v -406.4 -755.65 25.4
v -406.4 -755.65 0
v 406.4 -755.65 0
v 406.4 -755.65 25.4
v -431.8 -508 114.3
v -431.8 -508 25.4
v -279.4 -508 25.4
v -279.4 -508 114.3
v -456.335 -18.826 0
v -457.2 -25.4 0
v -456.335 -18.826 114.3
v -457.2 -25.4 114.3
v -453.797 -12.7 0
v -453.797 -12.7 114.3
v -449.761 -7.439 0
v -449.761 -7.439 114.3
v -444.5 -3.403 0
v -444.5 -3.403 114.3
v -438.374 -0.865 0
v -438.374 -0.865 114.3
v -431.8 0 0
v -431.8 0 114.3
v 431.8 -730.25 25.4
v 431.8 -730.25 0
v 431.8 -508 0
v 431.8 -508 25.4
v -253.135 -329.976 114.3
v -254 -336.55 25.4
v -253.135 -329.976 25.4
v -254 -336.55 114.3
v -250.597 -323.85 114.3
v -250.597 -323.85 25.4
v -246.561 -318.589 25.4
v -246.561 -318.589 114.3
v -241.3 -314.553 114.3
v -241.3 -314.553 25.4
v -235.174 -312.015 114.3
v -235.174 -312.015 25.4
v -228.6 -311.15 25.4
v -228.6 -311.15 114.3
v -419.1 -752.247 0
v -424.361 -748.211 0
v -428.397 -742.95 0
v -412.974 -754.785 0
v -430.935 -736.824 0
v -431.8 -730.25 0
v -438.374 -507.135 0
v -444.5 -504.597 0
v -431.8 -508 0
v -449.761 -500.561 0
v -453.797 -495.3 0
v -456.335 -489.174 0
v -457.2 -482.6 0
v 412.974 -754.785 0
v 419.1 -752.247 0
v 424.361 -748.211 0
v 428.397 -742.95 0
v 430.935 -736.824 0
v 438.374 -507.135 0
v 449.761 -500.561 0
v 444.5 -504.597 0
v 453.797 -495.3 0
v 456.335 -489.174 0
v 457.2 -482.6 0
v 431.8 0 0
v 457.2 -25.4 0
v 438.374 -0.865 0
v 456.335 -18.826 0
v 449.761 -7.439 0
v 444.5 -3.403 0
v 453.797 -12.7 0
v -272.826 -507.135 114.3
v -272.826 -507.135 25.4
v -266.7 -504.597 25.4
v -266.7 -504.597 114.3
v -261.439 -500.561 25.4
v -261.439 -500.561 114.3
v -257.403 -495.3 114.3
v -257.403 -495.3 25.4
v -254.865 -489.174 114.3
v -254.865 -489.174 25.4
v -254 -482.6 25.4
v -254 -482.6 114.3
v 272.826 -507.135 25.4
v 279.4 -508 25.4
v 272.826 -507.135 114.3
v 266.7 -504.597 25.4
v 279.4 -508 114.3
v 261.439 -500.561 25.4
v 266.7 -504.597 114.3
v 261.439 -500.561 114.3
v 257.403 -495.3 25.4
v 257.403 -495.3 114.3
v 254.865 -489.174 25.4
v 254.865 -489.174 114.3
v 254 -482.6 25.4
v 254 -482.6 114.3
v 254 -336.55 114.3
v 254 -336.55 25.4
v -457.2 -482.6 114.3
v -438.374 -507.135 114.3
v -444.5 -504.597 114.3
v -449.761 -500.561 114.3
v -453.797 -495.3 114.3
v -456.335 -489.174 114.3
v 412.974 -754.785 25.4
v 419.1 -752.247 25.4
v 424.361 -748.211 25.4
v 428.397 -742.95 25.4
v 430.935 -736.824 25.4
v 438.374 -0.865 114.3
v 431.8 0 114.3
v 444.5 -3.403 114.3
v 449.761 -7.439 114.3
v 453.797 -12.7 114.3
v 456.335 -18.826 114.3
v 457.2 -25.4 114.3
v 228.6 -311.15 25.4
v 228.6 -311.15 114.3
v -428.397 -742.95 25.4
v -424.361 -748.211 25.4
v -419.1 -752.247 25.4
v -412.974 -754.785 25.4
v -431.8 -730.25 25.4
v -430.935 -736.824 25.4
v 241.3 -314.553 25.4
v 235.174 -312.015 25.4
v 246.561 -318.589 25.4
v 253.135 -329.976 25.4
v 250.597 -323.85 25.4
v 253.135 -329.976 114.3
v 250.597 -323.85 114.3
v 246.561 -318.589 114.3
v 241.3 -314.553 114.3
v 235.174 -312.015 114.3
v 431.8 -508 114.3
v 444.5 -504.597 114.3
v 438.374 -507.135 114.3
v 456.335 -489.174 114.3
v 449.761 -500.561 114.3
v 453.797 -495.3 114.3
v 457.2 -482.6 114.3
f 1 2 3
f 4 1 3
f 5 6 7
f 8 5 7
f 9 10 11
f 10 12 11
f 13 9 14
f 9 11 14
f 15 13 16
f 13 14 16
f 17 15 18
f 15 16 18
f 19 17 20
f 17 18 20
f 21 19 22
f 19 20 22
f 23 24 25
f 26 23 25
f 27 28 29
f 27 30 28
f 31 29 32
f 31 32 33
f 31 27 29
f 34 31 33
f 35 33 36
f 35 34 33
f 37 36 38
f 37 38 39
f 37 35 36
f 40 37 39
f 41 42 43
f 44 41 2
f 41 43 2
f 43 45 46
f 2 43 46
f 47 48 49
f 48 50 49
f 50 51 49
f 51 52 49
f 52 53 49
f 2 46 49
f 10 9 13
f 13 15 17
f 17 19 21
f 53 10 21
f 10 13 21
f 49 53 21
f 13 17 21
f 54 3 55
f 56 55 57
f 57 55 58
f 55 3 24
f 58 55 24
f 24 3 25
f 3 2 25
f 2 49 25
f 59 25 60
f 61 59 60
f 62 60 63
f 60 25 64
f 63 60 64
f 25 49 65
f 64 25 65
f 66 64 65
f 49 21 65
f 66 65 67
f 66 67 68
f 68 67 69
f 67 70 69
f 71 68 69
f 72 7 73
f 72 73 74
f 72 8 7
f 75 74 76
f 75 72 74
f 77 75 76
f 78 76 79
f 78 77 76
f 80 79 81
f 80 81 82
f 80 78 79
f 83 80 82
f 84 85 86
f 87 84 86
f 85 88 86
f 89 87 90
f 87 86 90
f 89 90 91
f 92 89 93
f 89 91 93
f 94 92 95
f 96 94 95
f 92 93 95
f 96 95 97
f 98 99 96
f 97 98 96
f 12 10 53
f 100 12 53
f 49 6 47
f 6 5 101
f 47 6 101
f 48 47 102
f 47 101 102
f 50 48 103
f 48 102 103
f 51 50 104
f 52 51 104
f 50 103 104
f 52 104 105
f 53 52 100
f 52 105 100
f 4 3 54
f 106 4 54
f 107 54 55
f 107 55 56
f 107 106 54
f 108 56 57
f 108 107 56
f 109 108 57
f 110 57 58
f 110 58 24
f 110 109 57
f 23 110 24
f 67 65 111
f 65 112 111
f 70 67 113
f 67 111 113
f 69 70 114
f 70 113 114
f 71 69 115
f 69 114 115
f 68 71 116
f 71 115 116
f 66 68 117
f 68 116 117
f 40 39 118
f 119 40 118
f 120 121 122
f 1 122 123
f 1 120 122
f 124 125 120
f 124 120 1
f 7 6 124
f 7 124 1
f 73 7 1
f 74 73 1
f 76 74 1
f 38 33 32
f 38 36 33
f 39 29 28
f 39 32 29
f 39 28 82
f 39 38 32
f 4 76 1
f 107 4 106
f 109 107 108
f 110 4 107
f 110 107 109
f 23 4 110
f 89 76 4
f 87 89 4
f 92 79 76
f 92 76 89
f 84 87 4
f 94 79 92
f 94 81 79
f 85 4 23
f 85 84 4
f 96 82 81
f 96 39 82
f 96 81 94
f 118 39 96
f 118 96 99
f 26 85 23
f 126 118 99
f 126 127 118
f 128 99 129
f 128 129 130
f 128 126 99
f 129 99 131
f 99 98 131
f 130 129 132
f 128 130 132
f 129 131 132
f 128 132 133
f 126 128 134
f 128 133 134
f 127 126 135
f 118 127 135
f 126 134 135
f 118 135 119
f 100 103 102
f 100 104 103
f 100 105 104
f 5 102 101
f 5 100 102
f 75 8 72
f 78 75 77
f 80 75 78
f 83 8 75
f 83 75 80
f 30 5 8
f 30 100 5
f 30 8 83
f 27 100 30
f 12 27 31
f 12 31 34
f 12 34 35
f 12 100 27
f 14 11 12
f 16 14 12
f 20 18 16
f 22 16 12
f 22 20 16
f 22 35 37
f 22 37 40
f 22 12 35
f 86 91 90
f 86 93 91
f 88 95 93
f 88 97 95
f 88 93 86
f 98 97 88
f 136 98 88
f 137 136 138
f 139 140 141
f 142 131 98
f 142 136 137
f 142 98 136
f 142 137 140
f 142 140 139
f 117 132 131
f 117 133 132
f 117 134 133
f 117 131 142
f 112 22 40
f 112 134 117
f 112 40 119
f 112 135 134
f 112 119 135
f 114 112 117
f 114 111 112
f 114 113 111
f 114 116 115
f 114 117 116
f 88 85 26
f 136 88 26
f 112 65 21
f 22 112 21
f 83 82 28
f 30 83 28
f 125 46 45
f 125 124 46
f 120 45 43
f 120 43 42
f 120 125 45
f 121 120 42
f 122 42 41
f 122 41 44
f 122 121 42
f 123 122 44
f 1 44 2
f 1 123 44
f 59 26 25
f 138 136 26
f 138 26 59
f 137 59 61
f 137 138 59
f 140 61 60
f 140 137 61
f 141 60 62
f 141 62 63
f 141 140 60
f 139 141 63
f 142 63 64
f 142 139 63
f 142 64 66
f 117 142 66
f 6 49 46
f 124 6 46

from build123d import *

# Parameters (mm, degrees)
F1_DEPTH = 114.3
F2_DEPTH = 25.4
F3_R     = 25.4


with BuildPart() as f1:
    # F0 (on Top) → F1 (new body)
    with BuildSketch(Plane.XY):
        Polygon((457.2, 0), (-457.2, 0), (-457.2, -508), (-431.8, -508), (-254, -508), (-254, -311.15), (254, -311.15), (254, -508), (431.8, -508), (457.2, -508), align=None)
    extrude(amount=F1_DEPTH)

    # F0 (on Top) → F2 (join)
    with BuildSketch(Plane.XY):
        Polygon((-254, -508), (-431.8, -508), (-431.8, -755.65), (431.8, -755.65), (431.8, -508), (254, -508), (254, -311.15), (-254, -311.15), align=None)
    extrude(amount=F2_DEPTH)

    # F3
    f3_edges = [f1.edges().sort_by_distance(p)[0] for p in [
        (-457.2, -508, 57.15),
        (-431.8, -755.65, 12.7),
        (-254, -508, 69.85),
        (254, -311.15, 69.85),
        (254, -508, 69.85),
        (457.2, -508, 57.15),
        (431.8, -755.65, 12.7),
        (-254, -311.15, 69.85),
        (457.2, 0, 57.15),
        (-457.2, 0, 57.15),
    ]]
    fillet(f3_edges, radius=F3_R)


solid = f1.part
